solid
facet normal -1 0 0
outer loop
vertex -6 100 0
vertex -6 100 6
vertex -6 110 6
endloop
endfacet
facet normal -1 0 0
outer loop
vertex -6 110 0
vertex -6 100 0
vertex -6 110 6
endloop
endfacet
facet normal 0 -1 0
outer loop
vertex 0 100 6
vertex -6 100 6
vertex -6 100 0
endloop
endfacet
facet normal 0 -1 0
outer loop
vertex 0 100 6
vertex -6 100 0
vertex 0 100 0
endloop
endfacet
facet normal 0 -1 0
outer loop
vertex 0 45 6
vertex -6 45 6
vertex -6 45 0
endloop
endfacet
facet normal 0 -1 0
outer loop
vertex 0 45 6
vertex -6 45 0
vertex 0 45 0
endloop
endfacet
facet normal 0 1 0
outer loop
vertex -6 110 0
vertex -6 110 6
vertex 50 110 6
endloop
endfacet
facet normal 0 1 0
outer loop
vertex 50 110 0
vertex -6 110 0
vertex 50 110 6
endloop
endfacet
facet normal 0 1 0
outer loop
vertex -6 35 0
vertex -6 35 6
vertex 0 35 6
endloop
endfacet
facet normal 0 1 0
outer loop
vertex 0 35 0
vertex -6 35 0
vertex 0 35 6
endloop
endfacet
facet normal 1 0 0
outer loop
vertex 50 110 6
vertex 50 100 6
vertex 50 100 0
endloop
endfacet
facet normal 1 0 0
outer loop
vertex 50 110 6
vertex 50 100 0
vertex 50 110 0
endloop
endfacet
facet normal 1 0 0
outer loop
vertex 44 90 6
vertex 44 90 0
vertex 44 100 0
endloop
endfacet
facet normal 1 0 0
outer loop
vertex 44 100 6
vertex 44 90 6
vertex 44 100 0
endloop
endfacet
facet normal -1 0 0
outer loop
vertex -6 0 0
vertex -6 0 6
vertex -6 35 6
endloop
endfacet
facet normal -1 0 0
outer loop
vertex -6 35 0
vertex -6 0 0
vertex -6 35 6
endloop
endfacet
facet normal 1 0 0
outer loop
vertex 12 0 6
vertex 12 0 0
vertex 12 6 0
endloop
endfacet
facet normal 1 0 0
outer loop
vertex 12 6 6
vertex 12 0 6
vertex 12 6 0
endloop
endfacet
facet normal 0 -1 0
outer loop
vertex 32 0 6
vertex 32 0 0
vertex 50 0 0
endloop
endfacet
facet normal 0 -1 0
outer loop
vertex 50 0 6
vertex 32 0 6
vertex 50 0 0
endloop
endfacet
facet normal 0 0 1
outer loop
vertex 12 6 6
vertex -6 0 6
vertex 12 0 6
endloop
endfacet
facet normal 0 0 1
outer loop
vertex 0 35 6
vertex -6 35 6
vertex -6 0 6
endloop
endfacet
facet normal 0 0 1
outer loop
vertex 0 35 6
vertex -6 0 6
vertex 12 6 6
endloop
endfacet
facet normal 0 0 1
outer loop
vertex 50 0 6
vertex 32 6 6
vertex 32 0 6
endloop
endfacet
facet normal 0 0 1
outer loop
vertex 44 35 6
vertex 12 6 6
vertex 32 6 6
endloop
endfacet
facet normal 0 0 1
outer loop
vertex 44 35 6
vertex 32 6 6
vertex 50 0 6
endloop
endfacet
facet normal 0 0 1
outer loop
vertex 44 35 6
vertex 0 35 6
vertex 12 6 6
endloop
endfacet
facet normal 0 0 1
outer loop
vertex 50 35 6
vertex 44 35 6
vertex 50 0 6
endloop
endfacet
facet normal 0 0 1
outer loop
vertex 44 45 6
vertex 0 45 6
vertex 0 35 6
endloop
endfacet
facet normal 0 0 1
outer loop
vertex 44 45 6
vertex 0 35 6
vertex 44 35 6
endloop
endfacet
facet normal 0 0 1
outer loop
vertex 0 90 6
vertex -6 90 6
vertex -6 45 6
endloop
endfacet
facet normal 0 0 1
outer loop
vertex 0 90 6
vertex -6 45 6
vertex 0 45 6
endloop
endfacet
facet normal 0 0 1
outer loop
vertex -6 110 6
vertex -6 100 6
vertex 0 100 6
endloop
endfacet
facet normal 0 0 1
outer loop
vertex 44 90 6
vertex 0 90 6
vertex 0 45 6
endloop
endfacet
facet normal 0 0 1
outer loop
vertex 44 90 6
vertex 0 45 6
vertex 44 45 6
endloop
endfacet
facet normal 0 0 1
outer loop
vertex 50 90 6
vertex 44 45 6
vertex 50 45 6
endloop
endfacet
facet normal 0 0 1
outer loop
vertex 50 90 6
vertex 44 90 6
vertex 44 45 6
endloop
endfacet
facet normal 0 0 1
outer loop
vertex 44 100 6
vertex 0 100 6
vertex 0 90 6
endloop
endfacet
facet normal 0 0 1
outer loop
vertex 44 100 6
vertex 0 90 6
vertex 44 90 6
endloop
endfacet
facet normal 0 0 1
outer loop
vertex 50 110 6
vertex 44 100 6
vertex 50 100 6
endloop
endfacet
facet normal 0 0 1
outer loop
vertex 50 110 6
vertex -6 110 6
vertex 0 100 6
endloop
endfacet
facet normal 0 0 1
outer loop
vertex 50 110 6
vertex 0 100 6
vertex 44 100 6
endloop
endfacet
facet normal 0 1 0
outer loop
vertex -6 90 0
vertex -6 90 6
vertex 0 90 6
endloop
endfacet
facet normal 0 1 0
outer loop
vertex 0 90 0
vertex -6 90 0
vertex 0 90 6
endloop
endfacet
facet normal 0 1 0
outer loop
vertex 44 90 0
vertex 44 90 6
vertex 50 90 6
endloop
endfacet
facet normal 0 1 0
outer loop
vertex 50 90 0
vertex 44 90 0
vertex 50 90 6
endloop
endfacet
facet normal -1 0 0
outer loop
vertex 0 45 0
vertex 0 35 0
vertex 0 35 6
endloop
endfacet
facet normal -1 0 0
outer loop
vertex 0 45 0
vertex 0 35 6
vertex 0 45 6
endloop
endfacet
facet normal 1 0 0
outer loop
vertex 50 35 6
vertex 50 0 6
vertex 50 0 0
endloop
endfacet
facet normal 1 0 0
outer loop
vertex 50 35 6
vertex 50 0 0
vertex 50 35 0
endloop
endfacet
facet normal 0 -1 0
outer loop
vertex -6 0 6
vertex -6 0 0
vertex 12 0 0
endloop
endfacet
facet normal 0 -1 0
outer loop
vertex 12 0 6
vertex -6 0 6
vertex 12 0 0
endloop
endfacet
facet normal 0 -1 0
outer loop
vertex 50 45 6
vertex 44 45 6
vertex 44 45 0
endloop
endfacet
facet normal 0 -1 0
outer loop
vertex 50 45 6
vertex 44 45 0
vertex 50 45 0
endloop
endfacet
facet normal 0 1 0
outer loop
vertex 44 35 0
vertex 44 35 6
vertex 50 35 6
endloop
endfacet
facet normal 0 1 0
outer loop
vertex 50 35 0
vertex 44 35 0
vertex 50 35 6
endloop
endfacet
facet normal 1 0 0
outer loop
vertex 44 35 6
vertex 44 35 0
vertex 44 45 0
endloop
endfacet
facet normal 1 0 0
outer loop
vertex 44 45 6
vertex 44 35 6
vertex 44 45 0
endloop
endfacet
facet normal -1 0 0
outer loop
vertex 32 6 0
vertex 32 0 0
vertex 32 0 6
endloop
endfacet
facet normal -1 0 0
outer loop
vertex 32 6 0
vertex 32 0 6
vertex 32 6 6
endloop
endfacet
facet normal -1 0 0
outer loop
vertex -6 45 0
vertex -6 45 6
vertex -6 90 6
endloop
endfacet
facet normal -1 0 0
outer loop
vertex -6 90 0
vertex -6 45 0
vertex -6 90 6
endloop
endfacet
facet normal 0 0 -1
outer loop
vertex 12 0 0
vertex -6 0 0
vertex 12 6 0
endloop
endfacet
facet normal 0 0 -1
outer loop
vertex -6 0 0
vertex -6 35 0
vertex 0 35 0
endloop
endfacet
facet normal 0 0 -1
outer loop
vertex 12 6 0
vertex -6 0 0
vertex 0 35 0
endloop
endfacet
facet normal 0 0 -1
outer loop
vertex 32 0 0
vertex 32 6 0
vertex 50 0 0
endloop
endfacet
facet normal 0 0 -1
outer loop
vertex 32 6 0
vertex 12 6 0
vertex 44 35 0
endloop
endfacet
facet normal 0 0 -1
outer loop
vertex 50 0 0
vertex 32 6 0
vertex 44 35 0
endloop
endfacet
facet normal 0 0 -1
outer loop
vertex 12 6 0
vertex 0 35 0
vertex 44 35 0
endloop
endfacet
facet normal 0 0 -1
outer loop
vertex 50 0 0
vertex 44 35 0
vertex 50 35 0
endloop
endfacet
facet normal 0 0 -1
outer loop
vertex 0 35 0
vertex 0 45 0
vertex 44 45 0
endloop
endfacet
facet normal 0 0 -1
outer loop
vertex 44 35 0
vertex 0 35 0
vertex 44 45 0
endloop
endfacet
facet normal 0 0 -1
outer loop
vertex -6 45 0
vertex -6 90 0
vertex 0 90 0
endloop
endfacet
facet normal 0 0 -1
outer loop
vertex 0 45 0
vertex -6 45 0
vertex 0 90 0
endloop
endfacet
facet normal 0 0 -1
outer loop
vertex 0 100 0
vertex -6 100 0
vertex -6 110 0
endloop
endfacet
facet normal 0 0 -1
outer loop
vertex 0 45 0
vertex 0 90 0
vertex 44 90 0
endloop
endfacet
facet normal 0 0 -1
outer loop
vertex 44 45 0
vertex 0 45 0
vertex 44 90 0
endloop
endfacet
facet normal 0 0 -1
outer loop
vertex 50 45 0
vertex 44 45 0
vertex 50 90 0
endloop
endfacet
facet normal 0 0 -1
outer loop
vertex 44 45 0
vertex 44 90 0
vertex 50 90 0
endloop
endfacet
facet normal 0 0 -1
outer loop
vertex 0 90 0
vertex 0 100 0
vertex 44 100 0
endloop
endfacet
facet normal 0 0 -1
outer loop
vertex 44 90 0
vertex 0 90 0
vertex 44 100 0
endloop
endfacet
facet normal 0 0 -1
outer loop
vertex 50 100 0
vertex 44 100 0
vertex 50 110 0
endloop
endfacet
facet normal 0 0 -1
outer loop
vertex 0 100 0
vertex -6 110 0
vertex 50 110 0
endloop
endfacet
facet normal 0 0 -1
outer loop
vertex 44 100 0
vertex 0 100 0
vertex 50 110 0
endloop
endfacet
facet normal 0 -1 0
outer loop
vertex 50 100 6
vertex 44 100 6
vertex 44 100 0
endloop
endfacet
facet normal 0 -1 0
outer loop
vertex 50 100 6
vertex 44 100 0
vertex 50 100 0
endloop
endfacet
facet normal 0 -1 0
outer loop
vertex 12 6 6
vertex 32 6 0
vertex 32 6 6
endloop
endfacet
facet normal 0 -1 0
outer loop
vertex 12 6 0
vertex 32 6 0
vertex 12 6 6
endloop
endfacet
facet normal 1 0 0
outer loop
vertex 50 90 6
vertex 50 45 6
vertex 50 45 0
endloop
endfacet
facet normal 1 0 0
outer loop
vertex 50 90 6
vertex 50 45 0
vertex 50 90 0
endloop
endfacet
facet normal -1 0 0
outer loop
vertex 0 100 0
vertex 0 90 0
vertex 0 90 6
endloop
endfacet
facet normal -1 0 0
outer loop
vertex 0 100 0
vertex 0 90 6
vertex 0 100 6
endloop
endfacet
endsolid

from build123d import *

# Parameters (mm, degrees)
ESQUISSE1_W             = 44
ESQUISSE1_H             = 110
BOSS_EXTRU_1_DEPTH      = 6
ESQUISSE4_W             = 6
ESQUISSE4_H             = 10
ESQUISSE4_H_2           = 45
ESQUISSE4_H_3           = 35
BOSS_EXTRU_2_DEPTH      = 6
ESQUISSE5_W             = 20
ESQUISSE5_H             = 6
ENL_V_MAT_EXTRU_1_DEPTH = 6


with BuildPart() as part:
    # Esquisse1 → Boss.-Extru.1 (new body)
    with BuildSketch(Plane.XY):
        with Locations((22, 55)):
            Rectangle(ESQUISSE1_W, ESQUISSE1_H)
    extrude(amount=BOSS_EXTRU_1_DEPTH)

    # Esquisse4 → Boss.-Extru.2 (add)
    with BuildSketch(Plane.XY.offset(6)):
        with Locations((-3, 105)):
            Rectangle(ESQUISSE4_W, ESQUISSE4_H)
        with Locations((-3, 67.5)):
            Rectangle(ESQUISSE4_W, ESQUISSE4_H_2)
        with Locations((-3, 17.5)):
            Rectangle(ESQUISSE4_W, ESQUISSE4_H_3)
        with Locations((47, 17.5)):
            Rectangle(ESQUISSE4_W, ESQUISSE4_H_3)
        with Locations((47, 67.5)):
            Rectangle(ESQUISSE4_W, ESQUISSE4_H_2)
        with Locations((47, 105)):
            Rectangle(ESQUISSE4_W, ESQUISSE4_H)
    extrude(amount=-BOSS_EXTRU_2_DEPTH)

    # Esquisse5 → Enlèv. mat.-Extru.1 (cut)
    with BuildSketch(Plane(origin=(0, 0, 0), x_dir=(-1, 0, 0), z_dir=(0, 0, -1))):
        with Locations((-22, 3)):
            Rectangle(ESQUISSE5_W, ESQUISSE5_H)
    extrude(amount=-ENL_V_MAT_EXTRU_1_DEPTH, mode=Mode.SUBTRACT)


solid = part.part
